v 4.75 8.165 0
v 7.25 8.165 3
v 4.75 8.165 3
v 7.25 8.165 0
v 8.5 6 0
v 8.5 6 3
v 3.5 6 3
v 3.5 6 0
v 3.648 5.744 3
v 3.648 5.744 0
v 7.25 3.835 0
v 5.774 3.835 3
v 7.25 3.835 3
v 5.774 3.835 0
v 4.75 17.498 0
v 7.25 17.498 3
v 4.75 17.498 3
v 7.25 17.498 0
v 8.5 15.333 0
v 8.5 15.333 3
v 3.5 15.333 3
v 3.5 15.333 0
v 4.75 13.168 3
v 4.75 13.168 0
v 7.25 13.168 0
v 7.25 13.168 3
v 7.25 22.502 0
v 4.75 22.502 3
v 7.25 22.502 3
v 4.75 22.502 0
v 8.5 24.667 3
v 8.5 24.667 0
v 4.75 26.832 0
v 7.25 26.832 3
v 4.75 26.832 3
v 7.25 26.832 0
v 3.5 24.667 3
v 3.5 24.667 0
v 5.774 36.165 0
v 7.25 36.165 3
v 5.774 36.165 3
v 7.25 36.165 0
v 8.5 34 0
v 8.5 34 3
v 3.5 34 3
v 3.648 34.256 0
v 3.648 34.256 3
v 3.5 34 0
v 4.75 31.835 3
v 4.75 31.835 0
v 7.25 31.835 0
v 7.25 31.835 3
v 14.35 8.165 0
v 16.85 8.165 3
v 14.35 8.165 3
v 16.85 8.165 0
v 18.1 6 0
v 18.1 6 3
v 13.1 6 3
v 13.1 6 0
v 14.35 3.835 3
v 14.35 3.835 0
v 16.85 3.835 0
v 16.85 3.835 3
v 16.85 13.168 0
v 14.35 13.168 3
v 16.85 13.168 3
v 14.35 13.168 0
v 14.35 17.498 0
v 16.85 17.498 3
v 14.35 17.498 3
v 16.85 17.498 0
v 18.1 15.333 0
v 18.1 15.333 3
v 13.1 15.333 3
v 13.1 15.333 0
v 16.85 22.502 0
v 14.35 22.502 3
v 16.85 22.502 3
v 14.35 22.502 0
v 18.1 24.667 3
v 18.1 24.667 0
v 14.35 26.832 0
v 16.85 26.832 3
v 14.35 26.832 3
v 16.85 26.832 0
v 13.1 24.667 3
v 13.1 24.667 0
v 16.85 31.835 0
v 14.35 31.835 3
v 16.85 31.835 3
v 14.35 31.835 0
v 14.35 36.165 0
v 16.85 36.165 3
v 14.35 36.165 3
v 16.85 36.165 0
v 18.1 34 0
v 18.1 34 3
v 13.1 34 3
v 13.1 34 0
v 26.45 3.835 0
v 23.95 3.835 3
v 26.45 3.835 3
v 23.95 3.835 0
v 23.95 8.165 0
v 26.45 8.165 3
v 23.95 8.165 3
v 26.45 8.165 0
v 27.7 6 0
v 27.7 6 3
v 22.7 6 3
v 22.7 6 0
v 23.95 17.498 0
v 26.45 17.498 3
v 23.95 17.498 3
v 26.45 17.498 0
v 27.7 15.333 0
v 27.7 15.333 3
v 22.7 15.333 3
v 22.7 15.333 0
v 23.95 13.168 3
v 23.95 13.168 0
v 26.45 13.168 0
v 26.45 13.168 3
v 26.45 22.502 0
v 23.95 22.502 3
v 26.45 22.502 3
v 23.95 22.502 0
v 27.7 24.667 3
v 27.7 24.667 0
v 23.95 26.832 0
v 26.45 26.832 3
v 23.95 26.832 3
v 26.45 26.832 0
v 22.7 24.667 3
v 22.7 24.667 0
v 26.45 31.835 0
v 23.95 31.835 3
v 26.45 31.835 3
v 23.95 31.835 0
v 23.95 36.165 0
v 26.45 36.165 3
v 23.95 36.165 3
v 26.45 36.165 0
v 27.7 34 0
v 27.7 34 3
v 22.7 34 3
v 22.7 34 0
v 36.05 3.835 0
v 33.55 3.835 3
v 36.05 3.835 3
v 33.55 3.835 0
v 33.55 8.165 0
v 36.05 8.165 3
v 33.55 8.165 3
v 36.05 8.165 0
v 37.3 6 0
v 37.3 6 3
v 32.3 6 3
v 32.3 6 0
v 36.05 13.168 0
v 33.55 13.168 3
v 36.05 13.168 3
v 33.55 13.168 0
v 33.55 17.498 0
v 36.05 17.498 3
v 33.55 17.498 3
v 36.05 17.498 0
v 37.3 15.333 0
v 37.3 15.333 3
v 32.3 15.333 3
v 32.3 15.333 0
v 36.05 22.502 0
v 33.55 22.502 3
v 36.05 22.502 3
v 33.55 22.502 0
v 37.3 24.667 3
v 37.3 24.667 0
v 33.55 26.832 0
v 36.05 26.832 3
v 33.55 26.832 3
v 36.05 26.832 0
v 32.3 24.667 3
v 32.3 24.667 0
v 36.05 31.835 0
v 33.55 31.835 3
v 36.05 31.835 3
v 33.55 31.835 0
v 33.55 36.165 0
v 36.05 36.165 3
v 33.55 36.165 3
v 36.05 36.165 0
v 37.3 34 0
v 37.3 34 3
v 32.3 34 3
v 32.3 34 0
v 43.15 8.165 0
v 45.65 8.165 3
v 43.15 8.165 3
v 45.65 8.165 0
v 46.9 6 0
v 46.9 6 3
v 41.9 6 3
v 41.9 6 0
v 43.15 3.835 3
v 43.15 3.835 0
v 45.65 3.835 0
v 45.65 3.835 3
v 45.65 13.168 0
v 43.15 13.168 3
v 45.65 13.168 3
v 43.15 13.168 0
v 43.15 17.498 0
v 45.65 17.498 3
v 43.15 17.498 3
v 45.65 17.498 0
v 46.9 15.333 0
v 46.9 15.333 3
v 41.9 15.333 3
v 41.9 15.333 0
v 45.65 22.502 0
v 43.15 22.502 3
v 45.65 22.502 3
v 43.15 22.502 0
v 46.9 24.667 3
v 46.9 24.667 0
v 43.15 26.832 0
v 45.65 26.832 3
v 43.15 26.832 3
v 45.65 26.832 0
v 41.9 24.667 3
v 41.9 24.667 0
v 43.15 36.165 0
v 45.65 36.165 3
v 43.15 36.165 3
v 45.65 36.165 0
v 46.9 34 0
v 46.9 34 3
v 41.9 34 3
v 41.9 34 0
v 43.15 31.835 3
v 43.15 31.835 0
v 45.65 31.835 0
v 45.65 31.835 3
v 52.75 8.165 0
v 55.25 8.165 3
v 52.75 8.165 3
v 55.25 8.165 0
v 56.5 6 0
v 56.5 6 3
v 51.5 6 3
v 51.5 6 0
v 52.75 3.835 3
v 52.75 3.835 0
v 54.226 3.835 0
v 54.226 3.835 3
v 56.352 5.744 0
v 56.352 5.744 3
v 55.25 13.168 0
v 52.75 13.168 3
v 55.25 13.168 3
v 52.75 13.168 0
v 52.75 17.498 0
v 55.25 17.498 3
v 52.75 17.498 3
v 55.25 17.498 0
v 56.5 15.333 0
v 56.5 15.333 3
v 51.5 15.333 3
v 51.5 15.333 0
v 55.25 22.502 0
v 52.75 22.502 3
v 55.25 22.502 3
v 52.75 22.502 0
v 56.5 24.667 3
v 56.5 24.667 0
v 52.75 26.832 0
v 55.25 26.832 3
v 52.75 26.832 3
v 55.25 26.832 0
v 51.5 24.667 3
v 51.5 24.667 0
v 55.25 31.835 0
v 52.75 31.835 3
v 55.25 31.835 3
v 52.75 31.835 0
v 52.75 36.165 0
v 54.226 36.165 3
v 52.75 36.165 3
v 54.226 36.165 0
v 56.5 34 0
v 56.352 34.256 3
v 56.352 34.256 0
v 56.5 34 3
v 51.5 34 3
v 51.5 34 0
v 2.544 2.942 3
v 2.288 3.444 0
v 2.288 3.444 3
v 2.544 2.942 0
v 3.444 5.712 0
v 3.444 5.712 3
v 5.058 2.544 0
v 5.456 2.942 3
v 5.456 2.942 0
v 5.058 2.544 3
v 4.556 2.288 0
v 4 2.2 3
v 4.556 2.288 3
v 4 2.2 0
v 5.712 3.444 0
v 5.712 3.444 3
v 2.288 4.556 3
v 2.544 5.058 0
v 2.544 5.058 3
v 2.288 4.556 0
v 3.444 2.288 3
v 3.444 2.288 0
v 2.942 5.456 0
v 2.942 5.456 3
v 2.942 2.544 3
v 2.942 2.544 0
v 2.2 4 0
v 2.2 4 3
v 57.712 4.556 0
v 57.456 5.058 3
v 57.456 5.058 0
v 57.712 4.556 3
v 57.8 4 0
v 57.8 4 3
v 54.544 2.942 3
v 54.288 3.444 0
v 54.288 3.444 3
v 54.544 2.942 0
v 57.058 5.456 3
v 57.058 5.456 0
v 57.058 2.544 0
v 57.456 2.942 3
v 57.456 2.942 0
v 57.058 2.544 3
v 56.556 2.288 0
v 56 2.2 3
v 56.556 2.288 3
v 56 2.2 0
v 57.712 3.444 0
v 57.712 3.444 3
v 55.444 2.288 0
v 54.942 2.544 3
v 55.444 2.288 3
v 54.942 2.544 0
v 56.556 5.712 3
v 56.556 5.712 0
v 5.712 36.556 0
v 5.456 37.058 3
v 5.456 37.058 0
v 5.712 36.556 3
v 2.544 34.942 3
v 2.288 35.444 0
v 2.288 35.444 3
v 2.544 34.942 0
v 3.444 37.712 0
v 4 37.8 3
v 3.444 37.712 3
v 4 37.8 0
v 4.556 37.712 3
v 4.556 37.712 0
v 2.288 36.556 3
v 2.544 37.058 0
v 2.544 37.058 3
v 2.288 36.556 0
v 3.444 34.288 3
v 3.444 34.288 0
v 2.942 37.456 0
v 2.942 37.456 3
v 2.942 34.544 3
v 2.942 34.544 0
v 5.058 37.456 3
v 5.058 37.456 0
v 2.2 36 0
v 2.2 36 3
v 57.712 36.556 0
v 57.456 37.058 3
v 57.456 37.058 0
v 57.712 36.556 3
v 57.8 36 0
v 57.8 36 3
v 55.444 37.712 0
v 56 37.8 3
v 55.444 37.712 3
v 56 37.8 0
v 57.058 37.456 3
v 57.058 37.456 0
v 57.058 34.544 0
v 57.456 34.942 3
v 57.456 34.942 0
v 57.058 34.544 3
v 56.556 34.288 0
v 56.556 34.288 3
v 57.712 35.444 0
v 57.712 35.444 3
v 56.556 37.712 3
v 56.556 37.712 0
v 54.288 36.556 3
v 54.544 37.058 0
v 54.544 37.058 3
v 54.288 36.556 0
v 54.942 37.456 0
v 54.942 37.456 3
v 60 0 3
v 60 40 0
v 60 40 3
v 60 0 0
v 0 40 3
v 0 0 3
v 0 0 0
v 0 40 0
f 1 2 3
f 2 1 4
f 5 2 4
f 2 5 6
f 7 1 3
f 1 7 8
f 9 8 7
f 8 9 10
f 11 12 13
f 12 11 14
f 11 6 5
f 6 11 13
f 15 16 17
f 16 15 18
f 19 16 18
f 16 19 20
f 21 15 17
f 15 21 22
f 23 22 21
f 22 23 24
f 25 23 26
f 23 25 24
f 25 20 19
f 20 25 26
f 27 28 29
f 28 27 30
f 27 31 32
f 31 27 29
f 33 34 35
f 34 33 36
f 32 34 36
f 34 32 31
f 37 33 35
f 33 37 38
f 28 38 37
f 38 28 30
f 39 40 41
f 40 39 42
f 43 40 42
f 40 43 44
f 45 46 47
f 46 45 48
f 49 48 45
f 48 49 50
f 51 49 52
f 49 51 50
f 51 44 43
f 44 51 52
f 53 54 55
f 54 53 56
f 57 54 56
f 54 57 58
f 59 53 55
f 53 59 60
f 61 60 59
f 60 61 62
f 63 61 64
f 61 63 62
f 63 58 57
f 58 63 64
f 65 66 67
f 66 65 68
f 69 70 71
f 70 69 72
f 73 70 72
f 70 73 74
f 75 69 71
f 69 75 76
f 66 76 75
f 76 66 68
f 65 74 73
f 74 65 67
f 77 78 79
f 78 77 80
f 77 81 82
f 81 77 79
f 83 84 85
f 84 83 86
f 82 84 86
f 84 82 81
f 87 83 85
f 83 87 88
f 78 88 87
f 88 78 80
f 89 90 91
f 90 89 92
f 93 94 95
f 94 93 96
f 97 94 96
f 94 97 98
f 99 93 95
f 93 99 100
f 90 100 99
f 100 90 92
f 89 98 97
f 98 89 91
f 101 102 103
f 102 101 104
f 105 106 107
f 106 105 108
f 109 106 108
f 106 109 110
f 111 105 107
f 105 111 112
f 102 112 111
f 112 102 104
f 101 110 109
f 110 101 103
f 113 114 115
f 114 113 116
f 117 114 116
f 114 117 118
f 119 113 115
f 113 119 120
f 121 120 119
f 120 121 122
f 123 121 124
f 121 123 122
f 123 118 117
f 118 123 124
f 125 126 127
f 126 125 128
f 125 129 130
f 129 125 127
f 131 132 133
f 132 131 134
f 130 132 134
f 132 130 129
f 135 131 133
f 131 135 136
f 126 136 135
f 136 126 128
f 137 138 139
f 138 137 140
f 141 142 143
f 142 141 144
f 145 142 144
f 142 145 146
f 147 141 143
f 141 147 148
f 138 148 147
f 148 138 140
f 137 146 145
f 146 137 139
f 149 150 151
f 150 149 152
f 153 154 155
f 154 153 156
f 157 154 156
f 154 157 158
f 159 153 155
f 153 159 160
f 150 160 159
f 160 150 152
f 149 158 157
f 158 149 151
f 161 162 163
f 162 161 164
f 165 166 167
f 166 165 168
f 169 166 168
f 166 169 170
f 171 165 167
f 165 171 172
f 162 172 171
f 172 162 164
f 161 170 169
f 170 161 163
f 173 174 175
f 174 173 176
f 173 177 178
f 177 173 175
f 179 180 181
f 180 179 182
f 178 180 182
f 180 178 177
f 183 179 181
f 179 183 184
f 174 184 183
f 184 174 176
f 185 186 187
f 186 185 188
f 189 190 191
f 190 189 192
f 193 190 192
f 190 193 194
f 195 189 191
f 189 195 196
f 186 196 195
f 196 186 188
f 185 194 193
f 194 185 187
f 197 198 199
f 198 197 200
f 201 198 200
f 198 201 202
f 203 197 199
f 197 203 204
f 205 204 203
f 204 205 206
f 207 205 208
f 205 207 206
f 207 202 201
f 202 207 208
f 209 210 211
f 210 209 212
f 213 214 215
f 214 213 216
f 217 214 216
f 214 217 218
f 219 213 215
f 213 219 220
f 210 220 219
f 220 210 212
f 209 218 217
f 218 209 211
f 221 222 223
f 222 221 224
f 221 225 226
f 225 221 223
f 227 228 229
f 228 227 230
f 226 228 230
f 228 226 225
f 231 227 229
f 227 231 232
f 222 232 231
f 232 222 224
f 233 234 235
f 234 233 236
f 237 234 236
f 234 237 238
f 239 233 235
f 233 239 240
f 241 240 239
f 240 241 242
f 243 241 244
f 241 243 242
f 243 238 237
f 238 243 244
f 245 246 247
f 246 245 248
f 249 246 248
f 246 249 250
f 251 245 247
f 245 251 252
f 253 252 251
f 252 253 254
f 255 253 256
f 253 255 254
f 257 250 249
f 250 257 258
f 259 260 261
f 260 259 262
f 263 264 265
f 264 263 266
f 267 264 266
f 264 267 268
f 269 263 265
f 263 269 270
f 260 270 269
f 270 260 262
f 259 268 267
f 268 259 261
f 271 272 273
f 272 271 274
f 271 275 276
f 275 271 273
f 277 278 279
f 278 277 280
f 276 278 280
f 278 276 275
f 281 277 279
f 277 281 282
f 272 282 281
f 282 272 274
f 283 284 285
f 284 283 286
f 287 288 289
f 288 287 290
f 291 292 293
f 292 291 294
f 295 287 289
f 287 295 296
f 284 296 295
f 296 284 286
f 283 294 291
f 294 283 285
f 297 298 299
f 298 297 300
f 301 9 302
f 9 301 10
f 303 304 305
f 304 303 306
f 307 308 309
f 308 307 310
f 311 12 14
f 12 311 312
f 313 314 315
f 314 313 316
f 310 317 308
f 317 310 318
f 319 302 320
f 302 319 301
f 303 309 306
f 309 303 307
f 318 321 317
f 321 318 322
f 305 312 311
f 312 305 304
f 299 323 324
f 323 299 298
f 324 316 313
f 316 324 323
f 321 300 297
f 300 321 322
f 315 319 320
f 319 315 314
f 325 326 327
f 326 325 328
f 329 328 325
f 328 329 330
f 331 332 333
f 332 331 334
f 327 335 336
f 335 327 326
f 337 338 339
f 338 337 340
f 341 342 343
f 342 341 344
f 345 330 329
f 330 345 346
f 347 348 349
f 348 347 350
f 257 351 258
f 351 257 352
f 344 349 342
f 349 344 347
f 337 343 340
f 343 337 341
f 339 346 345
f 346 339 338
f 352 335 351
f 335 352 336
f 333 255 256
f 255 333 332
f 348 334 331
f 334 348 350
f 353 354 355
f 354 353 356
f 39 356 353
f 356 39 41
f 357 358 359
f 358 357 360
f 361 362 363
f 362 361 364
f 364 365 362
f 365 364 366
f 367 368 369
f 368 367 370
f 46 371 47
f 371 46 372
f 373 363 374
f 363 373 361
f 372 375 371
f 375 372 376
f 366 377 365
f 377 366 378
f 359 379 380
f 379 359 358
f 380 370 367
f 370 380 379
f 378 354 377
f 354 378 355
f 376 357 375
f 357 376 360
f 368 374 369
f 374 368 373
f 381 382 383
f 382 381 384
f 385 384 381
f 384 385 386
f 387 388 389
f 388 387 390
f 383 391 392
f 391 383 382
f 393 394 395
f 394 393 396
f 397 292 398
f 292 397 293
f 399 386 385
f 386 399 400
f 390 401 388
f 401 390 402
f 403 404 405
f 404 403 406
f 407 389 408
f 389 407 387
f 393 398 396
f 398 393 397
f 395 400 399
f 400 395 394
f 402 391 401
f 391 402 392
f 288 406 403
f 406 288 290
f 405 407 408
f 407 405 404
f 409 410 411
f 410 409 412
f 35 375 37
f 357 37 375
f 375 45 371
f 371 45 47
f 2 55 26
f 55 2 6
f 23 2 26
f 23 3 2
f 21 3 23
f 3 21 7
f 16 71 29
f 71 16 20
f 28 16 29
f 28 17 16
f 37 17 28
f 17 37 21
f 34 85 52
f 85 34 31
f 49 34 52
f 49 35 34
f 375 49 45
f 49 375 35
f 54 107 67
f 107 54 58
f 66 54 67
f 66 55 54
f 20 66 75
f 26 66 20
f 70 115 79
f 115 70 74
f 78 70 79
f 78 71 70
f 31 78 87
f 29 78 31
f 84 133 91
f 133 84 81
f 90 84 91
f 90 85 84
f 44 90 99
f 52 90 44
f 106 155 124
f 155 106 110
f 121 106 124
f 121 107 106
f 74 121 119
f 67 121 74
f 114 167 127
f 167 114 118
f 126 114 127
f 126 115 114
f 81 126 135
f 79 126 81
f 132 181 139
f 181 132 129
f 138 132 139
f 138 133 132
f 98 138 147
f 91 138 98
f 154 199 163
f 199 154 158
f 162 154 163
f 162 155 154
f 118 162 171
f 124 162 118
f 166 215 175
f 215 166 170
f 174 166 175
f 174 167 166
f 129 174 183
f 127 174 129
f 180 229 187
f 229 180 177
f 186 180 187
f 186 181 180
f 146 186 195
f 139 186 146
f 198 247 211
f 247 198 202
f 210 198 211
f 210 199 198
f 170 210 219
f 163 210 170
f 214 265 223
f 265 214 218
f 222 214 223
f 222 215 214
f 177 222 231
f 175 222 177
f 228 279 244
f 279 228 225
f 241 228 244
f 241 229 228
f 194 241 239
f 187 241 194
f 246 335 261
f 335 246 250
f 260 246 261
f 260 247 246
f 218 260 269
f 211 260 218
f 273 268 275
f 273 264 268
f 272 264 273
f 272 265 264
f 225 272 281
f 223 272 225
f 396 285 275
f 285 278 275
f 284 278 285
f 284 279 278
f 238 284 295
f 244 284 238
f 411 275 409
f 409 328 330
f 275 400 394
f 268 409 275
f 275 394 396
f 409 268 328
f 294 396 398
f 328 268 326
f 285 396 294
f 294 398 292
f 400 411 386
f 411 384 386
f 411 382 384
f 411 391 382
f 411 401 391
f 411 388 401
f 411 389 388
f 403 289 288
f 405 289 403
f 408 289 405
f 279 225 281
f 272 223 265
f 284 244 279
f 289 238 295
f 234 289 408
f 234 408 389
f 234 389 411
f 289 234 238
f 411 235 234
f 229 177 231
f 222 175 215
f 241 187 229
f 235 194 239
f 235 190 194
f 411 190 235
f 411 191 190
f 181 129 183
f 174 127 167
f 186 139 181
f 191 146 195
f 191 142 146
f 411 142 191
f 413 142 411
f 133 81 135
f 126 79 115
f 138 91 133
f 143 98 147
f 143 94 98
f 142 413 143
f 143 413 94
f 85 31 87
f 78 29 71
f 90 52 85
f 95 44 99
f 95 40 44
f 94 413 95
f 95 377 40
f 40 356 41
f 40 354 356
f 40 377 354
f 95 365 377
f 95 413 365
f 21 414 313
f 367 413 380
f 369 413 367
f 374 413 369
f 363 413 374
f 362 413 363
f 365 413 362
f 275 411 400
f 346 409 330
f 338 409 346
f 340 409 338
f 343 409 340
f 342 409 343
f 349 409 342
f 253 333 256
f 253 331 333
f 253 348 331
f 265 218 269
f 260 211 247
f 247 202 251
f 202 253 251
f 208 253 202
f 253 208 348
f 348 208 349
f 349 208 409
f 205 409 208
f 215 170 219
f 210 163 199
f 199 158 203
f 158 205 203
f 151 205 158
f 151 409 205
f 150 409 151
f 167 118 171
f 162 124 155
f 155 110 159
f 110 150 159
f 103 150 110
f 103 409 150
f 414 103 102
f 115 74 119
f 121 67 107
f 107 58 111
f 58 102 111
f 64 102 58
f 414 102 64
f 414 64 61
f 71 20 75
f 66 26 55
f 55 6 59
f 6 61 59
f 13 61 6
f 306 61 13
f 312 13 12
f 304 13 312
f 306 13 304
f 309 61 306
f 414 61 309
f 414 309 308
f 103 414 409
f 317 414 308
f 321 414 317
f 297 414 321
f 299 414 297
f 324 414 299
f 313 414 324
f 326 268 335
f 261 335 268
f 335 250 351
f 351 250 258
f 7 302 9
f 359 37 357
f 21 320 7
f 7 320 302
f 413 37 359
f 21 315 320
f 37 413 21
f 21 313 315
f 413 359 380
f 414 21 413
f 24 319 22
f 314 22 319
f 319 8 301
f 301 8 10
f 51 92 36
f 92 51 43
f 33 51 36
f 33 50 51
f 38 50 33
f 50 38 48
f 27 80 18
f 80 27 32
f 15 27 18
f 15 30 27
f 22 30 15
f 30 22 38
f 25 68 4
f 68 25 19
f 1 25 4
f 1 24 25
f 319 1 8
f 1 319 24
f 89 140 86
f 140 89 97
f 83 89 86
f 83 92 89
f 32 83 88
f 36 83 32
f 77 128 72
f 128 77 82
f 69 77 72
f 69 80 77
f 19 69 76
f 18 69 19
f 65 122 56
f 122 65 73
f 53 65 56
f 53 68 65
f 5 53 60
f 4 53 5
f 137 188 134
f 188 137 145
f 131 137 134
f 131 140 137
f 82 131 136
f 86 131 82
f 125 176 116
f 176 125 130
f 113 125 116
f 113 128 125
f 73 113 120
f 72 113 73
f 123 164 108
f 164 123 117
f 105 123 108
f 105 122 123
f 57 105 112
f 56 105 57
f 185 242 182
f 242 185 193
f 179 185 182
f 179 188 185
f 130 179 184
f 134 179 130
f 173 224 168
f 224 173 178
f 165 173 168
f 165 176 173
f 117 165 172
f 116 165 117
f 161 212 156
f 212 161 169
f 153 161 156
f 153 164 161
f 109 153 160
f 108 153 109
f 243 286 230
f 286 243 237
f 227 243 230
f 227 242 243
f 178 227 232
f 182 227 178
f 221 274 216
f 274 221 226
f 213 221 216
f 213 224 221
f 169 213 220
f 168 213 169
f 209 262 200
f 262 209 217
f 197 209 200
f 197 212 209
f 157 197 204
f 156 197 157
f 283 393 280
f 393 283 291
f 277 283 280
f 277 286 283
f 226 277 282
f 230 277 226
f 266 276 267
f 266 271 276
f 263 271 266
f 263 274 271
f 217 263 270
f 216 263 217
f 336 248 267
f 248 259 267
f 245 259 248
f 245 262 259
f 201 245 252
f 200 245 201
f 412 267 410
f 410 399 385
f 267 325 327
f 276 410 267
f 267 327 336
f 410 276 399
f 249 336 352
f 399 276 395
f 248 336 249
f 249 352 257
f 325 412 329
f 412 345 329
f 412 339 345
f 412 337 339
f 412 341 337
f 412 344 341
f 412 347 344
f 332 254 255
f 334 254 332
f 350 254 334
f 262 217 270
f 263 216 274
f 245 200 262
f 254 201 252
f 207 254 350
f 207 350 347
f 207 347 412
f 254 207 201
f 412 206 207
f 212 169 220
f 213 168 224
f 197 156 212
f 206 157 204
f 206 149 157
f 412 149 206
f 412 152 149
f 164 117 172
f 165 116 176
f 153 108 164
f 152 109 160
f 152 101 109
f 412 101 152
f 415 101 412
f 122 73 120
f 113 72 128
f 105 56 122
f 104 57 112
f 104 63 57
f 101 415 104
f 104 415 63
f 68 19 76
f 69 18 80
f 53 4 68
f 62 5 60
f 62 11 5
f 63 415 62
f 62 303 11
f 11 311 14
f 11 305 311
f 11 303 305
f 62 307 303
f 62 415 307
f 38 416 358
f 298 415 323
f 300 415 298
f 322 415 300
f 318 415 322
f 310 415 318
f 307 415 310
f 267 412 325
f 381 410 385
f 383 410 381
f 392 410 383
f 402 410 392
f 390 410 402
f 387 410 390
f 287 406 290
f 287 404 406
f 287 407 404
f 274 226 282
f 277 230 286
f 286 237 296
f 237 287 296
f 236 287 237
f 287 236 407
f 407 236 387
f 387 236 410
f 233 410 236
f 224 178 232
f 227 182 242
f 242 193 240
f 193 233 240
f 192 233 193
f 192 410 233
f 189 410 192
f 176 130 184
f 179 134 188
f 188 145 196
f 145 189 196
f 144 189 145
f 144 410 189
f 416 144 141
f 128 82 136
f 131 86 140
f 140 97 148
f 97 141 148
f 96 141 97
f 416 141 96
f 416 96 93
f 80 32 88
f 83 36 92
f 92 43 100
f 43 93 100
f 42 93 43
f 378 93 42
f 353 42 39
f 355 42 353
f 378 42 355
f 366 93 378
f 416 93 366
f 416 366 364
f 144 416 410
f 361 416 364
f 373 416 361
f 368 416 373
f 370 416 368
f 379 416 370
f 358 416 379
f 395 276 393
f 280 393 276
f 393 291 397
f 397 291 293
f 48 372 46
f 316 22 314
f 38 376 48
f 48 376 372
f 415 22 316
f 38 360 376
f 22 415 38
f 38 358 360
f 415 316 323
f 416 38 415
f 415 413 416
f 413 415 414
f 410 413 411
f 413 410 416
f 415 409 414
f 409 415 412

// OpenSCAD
// Real part: a vented cover plate — a grid of hex-ish vent slots punched
// through a panel by a nested for-loop.
// Constructs: difference, nested for-loop, translate, list comprehension, cube, cylinder.
panel = [60, 40, 3];
cols = 6;
rows = 4;
margin = 6;

step_x = (panel[0] - 2 * margin) / (cols - 1);
step_y = (panel[1] - 2 * margin) / (rows - 1);

difference() {
    cube(panel);
    for (i = [0 : cols - 1]) {
        for (j = [0 : rows - 1]) {
            translate([margin + i * step_x, margin + j * step_y, -1])
                cylinder(h = panel[2] + 2, r = 2.5, $fn = 6);
        }
    }
    // Corner mounting bores.
    for (c = [[4, 4], [panel[0] - 4, 4], [4, panel[1] - 4], [panel[0] - 4, panel[1] - 4]]) {
        translate([c[0], c[1], -1]) cylinder(h = panel[2] + 2, r = 1.8, $fn = 20);
    }
}
